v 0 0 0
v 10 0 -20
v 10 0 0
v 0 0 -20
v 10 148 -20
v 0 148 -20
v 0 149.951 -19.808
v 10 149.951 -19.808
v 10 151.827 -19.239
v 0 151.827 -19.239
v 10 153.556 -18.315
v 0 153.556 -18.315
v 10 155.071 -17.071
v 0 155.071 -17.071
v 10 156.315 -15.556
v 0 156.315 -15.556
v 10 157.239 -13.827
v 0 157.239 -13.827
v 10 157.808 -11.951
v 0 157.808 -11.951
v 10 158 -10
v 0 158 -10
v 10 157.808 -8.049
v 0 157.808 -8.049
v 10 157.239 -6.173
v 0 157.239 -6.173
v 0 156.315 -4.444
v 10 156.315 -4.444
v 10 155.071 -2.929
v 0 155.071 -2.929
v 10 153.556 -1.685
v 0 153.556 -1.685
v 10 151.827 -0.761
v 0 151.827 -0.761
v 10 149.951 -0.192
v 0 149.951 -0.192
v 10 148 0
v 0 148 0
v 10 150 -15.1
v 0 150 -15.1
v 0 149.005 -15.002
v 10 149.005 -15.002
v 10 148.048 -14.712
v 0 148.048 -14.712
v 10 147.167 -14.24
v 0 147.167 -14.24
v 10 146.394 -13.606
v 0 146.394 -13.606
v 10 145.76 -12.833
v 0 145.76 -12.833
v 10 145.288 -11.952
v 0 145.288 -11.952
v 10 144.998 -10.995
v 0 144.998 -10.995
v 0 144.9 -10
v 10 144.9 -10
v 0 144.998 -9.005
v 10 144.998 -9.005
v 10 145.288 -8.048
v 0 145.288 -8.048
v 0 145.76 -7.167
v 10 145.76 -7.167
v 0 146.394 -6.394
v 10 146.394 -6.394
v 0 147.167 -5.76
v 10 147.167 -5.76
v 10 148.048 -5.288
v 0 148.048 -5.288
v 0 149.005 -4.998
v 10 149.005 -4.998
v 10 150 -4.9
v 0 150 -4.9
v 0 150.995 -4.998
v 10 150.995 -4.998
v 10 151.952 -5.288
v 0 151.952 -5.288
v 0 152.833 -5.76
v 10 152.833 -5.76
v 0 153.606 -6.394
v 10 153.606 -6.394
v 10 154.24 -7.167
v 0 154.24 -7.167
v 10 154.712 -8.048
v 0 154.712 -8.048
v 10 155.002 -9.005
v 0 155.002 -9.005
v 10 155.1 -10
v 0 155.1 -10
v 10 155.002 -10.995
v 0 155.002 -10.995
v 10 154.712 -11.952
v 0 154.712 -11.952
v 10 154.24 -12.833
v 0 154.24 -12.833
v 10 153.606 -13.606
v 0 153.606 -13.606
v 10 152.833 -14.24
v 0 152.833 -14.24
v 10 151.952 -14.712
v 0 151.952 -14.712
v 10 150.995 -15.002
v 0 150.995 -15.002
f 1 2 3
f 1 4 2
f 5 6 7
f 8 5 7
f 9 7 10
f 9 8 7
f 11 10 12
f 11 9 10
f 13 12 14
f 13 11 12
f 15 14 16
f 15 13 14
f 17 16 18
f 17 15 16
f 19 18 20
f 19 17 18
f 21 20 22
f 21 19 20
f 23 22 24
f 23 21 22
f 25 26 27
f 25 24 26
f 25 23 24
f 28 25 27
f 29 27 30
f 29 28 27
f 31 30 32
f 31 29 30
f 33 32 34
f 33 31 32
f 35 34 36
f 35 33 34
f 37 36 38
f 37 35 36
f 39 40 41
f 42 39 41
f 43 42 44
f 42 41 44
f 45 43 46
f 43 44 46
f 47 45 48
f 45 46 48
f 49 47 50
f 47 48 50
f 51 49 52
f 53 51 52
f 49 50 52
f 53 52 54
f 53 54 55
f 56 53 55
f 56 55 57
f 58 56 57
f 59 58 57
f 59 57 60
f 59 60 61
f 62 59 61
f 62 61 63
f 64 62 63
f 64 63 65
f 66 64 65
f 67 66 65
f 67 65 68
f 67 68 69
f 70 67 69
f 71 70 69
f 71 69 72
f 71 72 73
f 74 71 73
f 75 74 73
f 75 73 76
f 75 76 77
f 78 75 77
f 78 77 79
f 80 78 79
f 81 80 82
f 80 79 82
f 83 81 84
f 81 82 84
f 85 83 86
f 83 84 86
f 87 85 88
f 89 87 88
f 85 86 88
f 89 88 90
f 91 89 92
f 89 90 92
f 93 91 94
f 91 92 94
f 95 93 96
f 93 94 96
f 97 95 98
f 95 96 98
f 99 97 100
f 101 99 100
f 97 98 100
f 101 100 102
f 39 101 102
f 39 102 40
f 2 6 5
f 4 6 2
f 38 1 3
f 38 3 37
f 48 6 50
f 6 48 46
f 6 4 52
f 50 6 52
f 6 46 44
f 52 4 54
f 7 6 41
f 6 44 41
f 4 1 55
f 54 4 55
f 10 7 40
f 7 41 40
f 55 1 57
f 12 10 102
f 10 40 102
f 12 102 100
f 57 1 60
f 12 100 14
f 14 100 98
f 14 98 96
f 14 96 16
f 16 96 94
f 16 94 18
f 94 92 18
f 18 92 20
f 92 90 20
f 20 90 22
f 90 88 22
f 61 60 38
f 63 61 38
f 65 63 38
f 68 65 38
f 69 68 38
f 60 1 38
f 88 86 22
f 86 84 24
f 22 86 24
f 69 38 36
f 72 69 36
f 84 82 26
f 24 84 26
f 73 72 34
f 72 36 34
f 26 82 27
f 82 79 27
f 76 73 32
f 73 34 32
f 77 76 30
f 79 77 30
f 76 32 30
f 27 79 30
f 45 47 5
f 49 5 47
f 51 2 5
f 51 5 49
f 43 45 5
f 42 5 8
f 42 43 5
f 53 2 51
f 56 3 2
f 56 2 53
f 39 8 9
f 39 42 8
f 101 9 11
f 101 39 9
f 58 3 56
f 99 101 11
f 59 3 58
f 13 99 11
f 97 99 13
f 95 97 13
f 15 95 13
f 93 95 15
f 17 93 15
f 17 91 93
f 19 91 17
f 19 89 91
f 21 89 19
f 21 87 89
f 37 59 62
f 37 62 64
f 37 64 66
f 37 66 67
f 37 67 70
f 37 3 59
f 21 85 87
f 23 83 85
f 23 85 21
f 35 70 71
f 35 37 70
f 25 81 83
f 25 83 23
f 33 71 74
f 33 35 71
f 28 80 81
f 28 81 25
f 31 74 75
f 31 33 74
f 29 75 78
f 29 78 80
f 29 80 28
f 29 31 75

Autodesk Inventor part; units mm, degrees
ref_plane "YZ Plane" through (0, 0, 0) normal (1, 0, 0) x (0, 1, 0)
ref_plane "XZ Plane" through (0, 0, 0) normal (0, 1, 0) x (-1, 0, 0)
ref_plane "XY Plane" through (0, 0, 0) normal (0, 0, 1) x (1, 0, 0)
sketch "Skizze1" plane through (0, 0, 0) normal (1, 0, 0) x (0, 1, 0)
  line L0 (0, 0) -> (158, 0)
  line L1 (158, 0) -> (158, -20)
  line L2 (158, -20) -> (0, -20)
  line L3 (0, -20) -> (0, 0)
  dimension "d0" = 158
  dimension "d1" = 20
extrude "Extrusion1" add sketch "Skizze1" along normal blind 10
sketch "Skizze2" plane through (10, 0, 0) normal (1, 0, 0) x (0, 0, -1)
  line L0 (0, 0) -> (20, 0) projected
  line L1 (20, 0) -> (20, 158) projected
  point P0 (10, 150)
  dimension "d11" = 150
  dimension "d12" = 10
hole "Bohrung1" at (10, 150, -10) direction (-1, 0, 0) diameter 10.2 end through all
fillet "Rundung1" radius 10 2 edges at (5, 158, 0) (5, 158, -20)
properties part number "HolzHalter"
